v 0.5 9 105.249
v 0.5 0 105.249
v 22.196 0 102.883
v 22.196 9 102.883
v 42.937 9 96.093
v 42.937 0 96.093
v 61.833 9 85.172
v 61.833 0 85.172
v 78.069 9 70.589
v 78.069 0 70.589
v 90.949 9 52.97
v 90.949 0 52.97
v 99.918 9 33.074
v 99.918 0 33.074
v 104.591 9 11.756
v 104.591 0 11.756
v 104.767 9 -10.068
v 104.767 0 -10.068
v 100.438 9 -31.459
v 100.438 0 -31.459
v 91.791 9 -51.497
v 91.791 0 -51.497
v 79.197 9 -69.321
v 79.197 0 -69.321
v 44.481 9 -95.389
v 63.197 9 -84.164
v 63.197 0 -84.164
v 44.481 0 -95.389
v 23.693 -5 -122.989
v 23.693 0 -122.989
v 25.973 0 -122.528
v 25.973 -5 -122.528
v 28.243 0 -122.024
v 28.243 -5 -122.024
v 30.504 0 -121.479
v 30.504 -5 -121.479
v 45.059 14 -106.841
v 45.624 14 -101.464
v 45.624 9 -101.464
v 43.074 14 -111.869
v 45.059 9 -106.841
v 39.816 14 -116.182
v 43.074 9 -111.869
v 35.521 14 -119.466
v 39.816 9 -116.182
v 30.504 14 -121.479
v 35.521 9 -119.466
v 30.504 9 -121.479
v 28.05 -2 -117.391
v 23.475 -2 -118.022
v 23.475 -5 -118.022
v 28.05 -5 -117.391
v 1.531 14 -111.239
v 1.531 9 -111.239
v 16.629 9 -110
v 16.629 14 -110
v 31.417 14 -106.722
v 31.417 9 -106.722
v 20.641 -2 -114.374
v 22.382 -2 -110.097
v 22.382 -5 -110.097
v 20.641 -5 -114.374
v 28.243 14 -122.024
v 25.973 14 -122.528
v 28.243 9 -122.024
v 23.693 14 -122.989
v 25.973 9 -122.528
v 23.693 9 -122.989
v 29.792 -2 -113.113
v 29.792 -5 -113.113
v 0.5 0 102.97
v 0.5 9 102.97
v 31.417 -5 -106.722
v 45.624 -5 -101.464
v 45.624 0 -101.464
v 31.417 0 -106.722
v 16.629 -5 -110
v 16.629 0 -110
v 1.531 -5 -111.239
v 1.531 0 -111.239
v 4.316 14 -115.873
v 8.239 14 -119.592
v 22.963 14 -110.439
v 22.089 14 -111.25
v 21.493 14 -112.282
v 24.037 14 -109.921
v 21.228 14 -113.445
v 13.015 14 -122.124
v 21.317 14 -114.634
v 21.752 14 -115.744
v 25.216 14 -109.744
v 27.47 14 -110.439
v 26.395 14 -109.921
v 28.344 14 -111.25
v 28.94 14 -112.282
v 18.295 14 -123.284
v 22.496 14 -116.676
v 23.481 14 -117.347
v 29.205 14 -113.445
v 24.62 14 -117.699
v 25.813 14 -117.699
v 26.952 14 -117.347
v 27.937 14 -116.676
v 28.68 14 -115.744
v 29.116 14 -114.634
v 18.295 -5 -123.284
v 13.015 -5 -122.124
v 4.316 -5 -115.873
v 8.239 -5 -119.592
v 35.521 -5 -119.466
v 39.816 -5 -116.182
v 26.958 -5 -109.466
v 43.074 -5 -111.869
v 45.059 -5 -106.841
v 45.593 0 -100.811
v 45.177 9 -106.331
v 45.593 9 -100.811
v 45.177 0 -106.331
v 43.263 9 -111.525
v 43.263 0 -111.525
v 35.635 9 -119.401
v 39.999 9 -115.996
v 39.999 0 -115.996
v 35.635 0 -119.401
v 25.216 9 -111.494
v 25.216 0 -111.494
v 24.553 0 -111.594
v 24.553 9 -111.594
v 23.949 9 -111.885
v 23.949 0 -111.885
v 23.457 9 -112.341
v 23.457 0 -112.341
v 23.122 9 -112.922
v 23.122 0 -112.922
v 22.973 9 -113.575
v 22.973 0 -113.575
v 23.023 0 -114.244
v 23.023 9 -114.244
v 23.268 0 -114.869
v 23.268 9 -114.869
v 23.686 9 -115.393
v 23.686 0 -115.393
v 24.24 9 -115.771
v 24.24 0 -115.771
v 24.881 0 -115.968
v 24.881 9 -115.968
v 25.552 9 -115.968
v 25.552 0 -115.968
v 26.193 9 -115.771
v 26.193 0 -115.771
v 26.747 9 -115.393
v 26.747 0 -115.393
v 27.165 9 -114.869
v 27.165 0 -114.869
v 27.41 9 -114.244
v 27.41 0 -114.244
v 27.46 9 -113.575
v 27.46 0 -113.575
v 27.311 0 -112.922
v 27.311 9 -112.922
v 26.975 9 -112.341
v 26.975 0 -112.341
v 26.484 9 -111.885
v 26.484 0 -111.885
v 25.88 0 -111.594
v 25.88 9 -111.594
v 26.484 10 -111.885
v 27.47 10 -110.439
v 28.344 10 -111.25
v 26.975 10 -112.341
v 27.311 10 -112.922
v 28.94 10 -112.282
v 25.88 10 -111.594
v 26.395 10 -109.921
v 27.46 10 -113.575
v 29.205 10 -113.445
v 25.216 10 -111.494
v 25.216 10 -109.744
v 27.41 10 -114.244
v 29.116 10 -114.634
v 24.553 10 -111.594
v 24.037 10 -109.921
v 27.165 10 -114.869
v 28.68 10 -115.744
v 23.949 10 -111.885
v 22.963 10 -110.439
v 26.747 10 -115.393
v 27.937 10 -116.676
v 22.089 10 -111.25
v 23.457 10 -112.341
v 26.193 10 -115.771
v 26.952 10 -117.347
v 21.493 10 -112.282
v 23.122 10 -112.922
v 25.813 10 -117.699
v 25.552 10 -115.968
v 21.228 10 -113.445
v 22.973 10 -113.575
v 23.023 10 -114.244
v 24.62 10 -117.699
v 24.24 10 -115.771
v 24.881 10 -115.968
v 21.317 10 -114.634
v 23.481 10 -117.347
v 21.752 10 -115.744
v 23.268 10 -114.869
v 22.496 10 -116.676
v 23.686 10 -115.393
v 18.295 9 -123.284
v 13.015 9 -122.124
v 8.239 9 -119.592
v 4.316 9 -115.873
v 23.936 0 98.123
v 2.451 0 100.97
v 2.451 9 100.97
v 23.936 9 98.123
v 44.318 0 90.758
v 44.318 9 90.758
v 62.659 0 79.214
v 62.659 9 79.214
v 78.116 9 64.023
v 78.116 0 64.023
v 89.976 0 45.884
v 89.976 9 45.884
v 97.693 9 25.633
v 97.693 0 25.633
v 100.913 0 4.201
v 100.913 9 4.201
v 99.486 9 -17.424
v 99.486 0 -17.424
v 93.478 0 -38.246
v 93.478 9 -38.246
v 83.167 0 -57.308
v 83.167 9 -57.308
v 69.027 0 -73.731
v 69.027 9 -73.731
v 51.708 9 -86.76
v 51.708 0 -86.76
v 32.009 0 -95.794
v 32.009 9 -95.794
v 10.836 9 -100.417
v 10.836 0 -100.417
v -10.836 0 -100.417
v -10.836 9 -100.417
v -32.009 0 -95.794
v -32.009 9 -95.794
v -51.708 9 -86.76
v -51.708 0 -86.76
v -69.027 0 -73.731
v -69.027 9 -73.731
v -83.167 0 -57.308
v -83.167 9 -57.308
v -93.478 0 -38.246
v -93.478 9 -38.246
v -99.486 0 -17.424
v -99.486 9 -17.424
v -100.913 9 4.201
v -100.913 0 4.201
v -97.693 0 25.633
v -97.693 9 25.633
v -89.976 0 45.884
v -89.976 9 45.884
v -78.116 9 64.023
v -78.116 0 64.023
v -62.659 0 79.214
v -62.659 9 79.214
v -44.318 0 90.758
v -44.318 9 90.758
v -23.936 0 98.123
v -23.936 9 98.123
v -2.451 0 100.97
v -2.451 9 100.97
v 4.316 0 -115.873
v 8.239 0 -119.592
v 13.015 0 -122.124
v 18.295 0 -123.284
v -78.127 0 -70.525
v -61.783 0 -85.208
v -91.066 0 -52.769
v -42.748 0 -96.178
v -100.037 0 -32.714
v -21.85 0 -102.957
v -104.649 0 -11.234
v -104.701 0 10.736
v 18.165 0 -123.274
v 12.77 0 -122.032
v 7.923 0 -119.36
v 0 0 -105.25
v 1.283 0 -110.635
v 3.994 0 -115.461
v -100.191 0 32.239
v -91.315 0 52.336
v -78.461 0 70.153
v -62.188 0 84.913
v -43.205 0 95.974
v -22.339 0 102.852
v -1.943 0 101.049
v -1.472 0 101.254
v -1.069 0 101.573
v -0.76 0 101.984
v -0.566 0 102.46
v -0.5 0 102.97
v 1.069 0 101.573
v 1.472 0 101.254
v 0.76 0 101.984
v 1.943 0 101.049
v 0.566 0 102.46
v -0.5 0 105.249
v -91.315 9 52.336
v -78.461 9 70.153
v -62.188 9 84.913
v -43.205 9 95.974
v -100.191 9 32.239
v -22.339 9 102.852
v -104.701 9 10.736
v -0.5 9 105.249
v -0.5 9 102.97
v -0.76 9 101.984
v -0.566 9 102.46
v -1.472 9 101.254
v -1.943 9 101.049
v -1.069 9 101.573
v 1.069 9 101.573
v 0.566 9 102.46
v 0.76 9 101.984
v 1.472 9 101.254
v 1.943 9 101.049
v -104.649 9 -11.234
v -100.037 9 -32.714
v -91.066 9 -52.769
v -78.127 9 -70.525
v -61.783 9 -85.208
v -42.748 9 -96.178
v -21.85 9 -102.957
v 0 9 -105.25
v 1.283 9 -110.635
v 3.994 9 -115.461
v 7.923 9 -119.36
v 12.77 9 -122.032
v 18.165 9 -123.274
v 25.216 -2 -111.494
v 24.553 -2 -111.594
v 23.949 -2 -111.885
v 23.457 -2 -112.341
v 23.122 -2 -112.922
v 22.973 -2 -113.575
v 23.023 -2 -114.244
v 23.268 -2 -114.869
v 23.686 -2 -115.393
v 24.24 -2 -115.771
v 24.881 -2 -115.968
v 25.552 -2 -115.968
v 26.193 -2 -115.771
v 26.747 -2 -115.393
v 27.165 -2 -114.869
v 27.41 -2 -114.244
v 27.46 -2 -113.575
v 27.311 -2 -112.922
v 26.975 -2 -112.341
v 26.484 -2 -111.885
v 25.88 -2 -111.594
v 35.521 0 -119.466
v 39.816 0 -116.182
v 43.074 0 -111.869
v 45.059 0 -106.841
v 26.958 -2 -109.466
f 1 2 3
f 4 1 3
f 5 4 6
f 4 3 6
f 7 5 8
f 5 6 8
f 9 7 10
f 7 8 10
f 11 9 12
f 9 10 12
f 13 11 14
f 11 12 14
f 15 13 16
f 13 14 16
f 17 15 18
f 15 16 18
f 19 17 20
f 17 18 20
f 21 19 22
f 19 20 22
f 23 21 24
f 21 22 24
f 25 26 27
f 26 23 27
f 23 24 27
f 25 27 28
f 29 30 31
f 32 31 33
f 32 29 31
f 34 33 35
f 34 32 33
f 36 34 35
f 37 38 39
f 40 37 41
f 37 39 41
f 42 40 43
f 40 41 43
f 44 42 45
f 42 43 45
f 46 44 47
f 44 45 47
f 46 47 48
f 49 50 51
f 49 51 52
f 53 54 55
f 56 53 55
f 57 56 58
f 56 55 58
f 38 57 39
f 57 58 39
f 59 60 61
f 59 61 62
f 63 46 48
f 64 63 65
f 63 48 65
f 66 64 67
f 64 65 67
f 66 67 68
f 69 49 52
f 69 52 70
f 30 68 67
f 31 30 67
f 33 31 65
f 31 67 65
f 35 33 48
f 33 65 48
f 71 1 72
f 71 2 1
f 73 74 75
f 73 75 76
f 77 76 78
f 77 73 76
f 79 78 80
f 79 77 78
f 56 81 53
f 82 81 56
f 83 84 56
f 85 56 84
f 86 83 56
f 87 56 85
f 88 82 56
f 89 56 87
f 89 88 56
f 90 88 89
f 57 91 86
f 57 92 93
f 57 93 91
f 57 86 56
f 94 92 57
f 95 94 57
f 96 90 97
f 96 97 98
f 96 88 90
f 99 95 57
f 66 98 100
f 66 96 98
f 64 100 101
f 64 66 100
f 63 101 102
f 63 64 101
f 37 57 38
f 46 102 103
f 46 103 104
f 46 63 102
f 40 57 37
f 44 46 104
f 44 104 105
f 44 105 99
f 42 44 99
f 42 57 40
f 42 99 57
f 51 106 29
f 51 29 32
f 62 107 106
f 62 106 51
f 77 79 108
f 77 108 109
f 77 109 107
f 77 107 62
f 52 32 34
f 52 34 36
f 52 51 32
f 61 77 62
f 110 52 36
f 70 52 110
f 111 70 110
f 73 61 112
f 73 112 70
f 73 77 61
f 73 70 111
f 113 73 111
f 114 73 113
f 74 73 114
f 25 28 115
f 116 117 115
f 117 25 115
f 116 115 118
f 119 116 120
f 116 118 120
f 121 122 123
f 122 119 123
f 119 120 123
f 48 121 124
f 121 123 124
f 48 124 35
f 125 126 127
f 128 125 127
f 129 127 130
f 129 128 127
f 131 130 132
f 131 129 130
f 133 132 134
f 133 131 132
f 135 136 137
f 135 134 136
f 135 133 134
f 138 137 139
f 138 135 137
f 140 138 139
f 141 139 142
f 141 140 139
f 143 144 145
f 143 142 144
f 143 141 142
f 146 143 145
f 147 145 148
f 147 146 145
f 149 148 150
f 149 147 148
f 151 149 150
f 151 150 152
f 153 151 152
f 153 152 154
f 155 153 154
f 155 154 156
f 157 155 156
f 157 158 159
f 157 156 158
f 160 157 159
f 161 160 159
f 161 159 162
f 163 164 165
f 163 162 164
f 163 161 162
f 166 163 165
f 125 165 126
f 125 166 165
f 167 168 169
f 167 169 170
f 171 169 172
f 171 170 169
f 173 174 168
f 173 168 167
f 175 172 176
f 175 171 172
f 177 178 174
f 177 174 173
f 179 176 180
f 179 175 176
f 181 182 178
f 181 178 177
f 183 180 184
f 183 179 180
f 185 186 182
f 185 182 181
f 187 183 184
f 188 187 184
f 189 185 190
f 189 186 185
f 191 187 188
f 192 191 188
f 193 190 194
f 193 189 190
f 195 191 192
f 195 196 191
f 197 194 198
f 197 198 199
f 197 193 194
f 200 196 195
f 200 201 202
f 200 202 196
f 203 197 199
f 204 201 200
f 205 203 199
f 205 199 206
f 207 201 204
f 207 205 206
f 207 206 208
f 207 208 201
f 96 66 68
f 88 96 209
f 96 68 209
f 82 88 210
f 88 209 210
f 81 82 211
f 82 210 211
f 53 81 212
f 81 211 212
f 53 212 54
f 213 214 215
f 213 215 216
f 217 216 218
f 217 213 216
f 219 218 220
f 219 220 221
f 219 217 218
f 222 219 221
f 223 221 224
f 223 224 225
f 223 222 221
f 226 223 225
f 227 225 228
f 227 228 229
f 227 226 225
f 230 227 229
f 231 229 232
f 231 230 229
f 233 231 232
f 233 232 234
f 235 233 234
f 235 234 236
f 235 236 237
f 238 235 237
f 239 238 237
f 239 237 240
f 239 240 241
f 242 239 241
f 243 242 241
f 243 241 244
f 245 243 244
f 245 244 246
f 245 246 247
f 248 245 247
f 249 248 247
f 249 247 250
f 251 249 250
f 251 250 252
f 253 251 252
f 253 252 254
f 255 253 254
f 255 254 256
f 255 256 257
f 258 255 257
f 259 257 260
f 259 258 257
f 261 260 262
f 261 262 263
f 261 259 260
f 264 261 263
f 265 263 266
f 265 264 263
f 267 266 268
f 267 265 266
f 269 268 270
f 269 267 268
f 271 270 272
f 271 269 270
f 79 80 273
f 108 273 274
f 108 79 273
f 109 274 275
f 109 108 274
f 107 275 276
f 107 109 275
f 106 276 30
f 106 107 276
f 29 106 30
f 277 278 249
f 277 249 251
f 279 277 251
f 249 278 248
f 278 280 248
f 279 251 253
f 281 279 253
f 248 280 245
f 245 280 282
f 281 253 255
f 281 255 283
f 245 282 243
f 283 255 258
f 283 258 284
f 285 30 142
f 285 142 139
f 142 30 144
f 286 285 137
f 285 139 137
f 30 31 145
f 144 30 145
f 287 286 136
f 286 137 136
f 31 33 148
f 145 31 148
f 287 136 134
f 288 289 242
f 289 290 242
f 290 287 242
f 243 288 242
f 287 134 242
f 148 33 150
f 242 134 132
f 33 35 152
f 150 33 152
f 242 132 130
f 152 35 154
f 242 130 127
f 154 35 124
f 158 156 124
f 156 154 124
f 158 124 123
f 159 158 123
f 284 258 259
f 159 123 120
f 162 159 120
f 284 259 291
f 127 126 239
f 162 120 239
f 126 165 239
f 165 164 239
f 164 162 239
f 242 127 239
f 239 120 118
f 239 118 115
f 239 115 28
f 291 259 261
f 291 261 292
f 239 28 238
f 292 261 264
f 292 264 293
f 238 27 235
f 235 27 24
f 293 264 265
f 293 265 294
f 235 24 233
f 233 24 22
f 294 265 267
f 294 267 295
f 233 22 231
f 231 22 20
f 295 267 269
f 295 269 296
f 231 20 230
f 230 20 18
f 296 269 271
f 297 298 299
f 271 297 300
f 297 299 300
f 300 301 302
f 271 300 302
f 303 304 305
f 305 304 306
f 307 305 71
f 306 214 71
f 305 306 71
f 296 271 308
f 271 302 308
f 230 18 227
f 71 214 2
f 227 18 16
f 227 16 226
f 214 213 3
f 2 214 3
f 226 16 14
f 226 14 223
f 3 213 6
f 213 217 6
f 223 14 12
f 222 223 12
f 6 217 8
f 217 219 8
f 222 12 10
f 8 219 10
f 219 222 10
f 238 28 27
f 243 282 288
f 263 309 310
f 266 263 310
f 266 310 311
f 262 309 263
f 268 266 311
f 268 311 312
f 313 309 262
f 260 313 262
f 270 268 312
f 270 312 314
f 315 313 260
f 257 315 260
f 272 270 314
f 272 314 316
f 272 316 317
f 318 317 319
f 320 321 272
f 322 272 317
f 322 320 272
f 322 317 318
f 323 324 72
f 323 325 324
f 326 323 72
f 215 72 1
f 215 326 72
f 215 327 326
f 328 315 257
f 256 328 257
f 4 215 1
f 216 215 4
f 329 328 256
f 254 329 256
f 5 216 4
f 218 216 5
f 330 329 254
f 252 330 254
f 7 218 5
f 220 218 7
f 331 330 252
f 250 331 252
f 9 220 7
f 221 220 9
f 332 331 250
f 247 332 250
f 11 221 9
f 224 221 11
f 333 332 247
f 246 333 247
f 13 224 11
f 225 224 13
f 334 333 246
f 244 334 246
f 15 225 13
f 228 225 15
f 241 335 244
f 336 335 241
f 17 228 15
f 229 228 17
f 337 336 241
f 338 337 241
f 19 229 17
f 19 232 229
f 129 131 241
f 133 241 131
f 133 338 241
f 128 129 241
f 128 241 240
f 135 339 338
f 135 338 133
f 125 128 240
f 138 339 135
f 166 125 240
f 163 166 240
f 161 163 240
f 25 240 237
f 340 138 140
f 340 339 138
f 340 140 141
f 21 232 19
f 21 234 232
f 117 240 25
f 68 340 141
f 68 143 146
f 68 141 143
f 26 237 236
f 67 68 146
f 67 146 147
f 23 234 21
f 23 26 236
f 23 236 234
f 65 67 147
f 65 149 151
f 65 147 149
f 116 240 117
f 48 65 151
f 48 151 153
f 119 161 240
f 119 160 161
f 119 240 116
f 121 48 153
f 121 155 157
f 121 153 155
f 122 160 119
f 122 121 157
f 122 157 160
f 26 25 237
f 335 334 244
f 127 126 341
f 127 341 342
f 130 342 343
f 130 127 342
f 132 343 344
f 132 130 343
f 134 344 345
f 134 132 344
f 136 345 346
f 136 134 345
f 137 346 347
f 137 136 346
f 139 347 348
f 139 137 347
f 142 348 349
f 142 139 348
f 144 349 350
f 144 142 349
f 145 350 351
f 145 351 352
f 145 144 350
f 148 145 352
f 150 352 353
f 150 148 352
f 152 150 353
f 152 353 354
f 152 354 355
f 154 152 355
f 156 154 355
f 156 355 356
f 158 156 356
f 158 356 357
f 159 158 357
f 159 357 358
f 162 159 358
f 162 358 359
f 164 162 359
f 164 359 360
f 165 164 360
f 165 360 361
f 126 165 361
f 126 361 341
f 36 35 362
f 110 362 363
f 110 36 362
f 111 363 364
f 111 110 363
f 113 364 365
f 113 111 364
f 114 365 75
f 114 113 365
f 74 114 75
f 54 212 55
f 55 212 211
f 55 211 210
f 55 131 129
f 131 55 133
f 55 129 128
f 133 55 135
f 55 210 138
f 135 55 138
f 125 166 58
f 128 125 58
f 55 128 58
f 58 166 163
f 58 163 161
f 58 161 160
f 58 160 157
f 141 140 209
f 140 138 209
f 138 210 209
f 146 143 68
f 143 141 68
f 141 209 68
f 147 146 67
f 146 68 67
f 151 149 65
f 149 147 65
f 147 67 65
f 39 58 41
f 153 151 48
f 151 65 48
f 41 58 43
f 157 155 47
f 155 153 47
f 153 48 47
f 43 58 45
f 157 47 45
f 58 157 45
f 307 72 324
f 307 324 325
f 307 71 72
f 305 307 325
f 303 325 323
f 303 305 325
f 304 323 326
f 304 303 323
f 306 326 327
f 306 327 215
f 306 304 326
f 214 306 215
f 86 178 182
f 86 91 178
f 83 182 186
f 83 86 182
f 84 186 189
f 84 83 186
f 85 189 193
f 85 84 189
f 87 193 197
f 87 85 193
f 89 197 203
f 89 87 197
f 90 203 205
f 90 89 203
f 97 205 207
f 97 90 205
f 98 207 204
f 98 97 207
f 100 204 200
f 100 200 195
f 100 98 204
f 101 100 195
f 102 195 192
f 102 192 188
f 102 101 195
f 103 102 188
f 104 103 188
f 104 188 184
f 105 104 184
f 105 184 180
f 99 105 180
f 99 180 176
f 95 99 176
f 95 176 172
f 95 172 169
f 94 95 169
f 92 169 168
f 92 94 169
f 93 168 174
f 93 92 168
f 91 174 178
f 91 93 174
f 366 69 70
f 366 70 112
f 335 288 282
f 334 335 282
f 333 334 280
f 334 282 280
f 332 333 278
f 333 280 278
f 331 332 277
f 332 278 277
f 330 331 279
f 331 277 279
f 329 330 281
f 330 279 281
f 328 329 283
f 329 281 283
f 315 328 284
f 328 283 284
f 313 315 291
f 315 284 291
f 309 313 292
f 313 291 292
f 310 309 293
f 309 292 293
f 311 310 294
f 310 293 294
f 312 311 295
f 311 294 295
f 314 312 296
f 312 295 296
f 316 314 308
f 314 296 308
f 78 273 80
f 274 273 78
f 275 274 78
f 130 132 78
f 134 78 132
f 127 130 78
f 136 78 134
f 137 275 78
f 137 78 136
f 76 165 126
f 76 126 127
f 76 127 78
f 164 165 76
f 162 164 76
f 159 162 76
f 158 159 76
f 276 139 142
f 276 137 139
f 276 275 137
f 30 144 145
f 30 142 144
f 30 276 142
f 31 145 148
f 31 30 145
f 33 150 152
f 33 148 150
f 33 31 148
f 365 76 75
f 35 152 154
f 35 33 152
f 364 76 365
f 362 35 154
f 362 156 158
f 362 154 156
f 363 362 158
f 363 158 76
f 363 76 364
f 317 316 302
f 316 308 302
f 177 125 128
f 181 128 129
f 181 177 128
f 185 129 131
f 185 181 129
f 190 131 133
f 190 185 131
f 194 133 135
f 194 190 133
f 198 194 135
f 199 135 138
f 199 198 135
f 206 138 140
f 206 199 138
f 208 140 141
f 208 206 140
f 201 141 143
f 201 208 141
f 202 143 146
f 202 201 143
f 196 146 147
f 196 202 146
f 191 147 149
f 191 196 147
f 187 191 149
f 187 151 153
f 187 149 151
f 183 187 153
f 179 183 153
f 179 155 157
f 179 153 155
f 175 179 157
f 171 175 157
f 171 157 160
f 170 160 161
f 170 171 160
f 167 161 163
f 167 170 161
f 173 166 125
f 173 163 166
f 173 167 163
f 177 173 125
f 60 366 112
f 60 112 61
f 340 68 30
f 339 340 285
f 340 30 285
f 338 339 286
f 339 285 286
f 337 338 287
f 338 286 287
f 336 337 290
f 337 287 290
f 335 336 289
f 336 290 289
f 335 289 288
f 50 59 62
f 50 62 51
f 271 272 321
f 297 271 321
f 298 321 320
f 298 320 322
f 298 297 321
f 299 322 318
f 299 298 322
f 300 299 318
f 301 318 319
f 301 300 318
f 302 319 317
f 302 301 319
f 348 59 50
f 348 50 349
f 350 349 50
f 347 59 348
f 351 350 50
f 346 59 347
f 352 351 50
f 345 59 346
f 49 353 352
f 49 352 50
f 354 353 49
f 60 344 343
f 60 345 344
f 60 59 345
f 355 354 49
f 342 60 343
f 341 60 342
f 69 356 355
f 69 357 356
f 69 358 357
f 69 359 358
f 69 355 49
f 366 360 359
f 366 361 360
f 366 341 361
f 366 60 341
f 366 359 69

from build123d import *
from build123d.topology import SkipClean

# Parameters (mm, degrees)
SKETCH1_R               = 105.25
SKETCH1_R_2             = 101
BOSS_EXTRUDE1_DEPTH     = 9
SKETCH2_W               = 20
SKETCH2_H               = 9
REVOLVE1_ANGLE          = 25
FILLET1_R               = 20
BOSS_EXTRUDE3_DEPTH     = 5
BOSS_EXTRUDE4_START     = 5
SKETCH7_R               = 2.25
BOSS_EXTRUDE4_DEPTH     = 5
CUT_EXTRUDE1_DEPTH      = 164.259690069
CUT_EXTRUDE1_DEPTH_BACK = 3
CUT_EXTRUDE2_DEPTH      = 163.753575695
CUT_EXTRUDE2_DEPTH_BACK = 163.753575695
SKETCH9_W               = 1
SKETCH9_H               = 21.725732916
FILLET2_R               = 2


# Read off the part's stored shape, not the designer's step: Split1, Split2
with BuildPart() as part:
    # Sketch1 → Boss-Extrude1 (new body)
    with BuildSketch(Plane(origin=(0, 0, 0), x_dir=(1, 0, 0), z_dir=(0, 1, 0))):
        with Locations(Location((0, 0, 0), (0, 0, 270))):
            Circle(SKETCH1_R)
        with Locations(Location((0, 0, 0), (0, 0, 270))):
            Circle(SKETCH1_R_2, mode=Mode.SUBTRACT)
    extrude(amount=BOSS_EXTRUDE1_DEPTH)

    # Sketch2 → Revolve1 (revolve)
    with BuildSketch(Plane(origin=(0, 0, 0), x_dir=(0, 0, -1), z_dir=(1, 0, 0))):
        with Locations((115.25, 4.5)):
            Rectangle(SKETCH2_W, SKETCH2_H)
    revolve(axis=Axis((0, 9, 0), (0, -1, 0)), revolution_arc=REVOLVE1_ANGLE)

    # Fillet1
    # the kernel refuses this fillet: 20 mm, written as the material it takes off along each edge
    with BuildSketch(Plane(origin=(0, -59.501187648, -125.25), x_dir=(0.9954761390042871, 0, 0.09501187648455978), z_dir=(0, 1, 0))) as fillet1_piece_1:
        with BuildLine():
            CenterArc((21.90023753, -19.90952278), FILLET1_R, 84.547996623, 95.452003377)
            Line((1.90023753, -19.90952278), (1.50023753, -19.90952278))
            ThreePointArc((1.50023753, -19.90952278), (0.551928309, -9.992766141), (-0.398190456, -0.038004751))
            Line((-0.398190456, -0.038004751), (-0.038004751, 0.398190456))
            ThreePointArc((-0.038004751, 0.398190456), (11.90023753, 0.96661359), (23.83847981, 0.398190456))
            Line((23.83847981, 0.398190456), (23.800475059, 0))
        make_face()
    extrude(amount=128.002375297, mode=Mode.SUBTRACT)
    with BuildSketch(Plane(origin=(52.932937283, -59.501187648, -113.515050326), x_dir=(-0.4226182617406998, 0, 0.9063077870366498), z_dir=(0, 1, 0))) as fillet1_piece_2:
        with BuildLine():
            CenterArc((21.90023753, -19.90952278), FILLET1_R, 95.452003377, 95.452003377)
            Line((2.261327797, -23.692805019), (1.868549602, -23.768470663))
            ThreePointArc((1.868549602, -23.768470663), (0.168423134, -11.93824228), (-0.4, 0))
            Line((-0.4, 0), (0, 0.4))
            ThreePointArc((0, 0.4), (10, 0.4), (19.961995249, 0.398190456))
            Line((19.961995249, 0.398190456), (20, 0))
        make_face()
    extrude(amount=128.002375297, mode=Mode.SUBTRACT)

    # Sketch3 → Boss-Extrude3 (add)
    with BuildSketch(Plane(origin=(0, 9, 0), x_dir=(1, 0, 0), z_dir=(0, 1, 0))):
        with BuildLine():
            ThreePointArc((45.623840254, 101.464415932), (41.591560528, 114.136329191), (30.504285175, 121.478603408))
            ThreePointArc((30.504285175, 121.478603408), (27.109061646, 122.281074892), (23.692805019, 122.988672203))
            ThreePointArc((23.692805019, 122.988672203), (10.541341863, 121.019996943), (1.531473393, 111.239458329))
            ThreePointArc((1.531473393, 111.239458329), (24.078907051, 108.612930792), (45.623840254, 101.464415932))
        make_face()
    extrude(amount=BOSS_EXTRUDE3_DEPTH)


with BuildPart() as body_2:
    # Split1: the piece on the far side of the plane
    add(part.part)
    split(bisect_by=Plane(origin=(0, 9, 0), x_dir=(1, 0, 0), z_dir=(0, 1, 0)), keep=Keep.BOTTOM)


with BuildPart() as part_1:
    add(part.part)

    # Split1
    split(bisect_by=Plane(origin=(0, 9, 0), x_dir=(1, 0, 0), z_dir=(0, 1, 0)), keep=Keep.TOP)


with BuildPart() as cbore_for_m4_shcs1_tool:
    # Sketch6 → CBORE for M4 SHCS1 (revolve)
    with BuildSketch(Plane(origin=(25.216346049, 14, -113.743586553), x_dir=(0, 0, 1), z_dir=(1, 0, 0))):
        Polygon((0, 0), (0, 14), (2.25, 14), (2.25, 4), (4, 4), (4, 0), align=None)
    revolve(axis=Axis((25.216346049, 20.35, -113.743586553), (0, -1, 0)))


with BuildPart() as part_2:
    add(part_1.part)

    # CBORE for M4 SHCS1: cut by cbore_for_m4_shcs1_tool
    add(cbore_for_m4_shcs1_tool.part, mode=Mode.SUBTRACT)


with BuildPart() as body_2_1:
    add(body_2.part)

    # CBORE for M4 SHCS1: cut by cbore_for_m4_shcs1_tool
    add(cbore_for_m4_shcs1_tool.part, mode=Mode.SUBTRACT)

    # Sketch7 → Boss-Extrude4 (add)
    # profile 1 of 2: a face of its own
    with SkipClean():  # the faces are left unmerged after this step: merging them gives an invalid solid
        with BuildSketch(Plane.XZ.offset(BOSS_EXTRUDE4_START)):
            with BuildLine():
                ThreePointArc((45.623840254, -101.464415932), (24.078907051, -108.612930792), (1.531473393, -111.239458329))
                ThreePointArc((1.531473393, -111.239458329), (10.541341863, -121.019996943), (23.692805019, -122.988672203))
                ThreePointArc((23.692805019, -122.988672203), (27.109061646, -122.281074892), (30.504285175, -121.478603408))
                ThreePointArc((30.504285175, -121.478603408), (41.591560528, -114.136329191), (45.623840254, -101.464415932))
            make_face()
            Polygon((25.443065501, -109.130352154), (29.324883958, -111.633314159), (29.098164506, -116.246548558), (24.989626597, -118.356820953), (21.107808139, -115.853858948), (21.334527591, -111.240624549), align=None, mode=Mode.SUBTRACT)
        # profile 2 of 2: a face of its own
        with BuildSketch(Plane.XZ.offset(BOSS_EXTRUDE4_START)):
            Polygon((24.989626597, -118.356820953), (29.098164506, -116.246548558), (29.324883958, -111.633314159), (25.443065501, -109.130352154), (21.334527591, -111.240624549), (21.107808139, -115.853858948), align=None)
            with Locations(Location((25.216346049, -113.743586553, 0), (0, 0, 90))):
                Circle(SKETCH7_R, mode=Mode.SUBTRACT)
        extrude(amount=-BOSS_EXTRUDE4_DEPTH)

    # Sketch8 → Cut-Extrude1 (cut, two sides: drawn at the far end of the back side and taken through both)
    with SkipClean():  # the faces are left unmerged after this step: merging them gives an invalid solid
        with BuildSketch(Plane.XZ.offset(5).offset(-CUT_EXTRUDE1_DEPTH_BACK)):
            Polygon((29.791855737, -113.112678931), (26.957718864, -109.465625117), (22.382209176, -110.096532739), (20.640836361, -114.374494176), (23.474973233, -118.02154799), (28.050482921, -117.390640367), align=None)
        extrude(amount=CUT_EXTRUDE1_DEPTH + CUT_EXTRUDE1_DEPTH_BACK, mode=Mode.SUBTRACT)


with BuildPart() as body_3:
    # Split2: the piece on the far side of the plane
    add(body_2_1.part)
    split(bisect_by=Plane(origin=(0, 0, 0), x_dir=(1, 0, 0), z_dir=(0, 1, 0)), keep=Keep.BOTTOM)


with BuildPart() as body_2_2:
    add(body_2_1.part)

    # Split2
    split(bisect_by=Plane(origin=(0, 0, 0), x_dir=(1, 0, 0), z_dir=(0, 1, 0)), keep=Keep.TOP)

    # Sketch9 → Cut-Extrude2 (cut, two sides: drawn at the far end of the back side and taken through both)
    with BuildSketch(Plane(origin=(0, 9, 0), x_dir=(1, 0, 0), z_dir=(0, 1, 0)).offset(-CUT_EXTRUDE2_DEPTH_BACK)):
        with Locations((0, -105.25)):
            Rectangle(SKETCH9_W, SKETCH9_H)
    extrude(amount=CUT_EXTRUDE2_DEPTH + CUT_EXTRUDE2_DEPTH_BACK, mode=Mode.SUBTRACT)

    # Fillet2
    fillet2_edges = [body_2_2.edges().sort_by_distance(p)[0] for p in [
        (-0.5, 4.5, 100.998762369),
        (0.5, 4.5, 100.998762369),
    ]]
    fillet(fillet2_edges, radius=FILLET2_R)


solid = Compound([part_2.part, body_3.part, body_2_2.part])
